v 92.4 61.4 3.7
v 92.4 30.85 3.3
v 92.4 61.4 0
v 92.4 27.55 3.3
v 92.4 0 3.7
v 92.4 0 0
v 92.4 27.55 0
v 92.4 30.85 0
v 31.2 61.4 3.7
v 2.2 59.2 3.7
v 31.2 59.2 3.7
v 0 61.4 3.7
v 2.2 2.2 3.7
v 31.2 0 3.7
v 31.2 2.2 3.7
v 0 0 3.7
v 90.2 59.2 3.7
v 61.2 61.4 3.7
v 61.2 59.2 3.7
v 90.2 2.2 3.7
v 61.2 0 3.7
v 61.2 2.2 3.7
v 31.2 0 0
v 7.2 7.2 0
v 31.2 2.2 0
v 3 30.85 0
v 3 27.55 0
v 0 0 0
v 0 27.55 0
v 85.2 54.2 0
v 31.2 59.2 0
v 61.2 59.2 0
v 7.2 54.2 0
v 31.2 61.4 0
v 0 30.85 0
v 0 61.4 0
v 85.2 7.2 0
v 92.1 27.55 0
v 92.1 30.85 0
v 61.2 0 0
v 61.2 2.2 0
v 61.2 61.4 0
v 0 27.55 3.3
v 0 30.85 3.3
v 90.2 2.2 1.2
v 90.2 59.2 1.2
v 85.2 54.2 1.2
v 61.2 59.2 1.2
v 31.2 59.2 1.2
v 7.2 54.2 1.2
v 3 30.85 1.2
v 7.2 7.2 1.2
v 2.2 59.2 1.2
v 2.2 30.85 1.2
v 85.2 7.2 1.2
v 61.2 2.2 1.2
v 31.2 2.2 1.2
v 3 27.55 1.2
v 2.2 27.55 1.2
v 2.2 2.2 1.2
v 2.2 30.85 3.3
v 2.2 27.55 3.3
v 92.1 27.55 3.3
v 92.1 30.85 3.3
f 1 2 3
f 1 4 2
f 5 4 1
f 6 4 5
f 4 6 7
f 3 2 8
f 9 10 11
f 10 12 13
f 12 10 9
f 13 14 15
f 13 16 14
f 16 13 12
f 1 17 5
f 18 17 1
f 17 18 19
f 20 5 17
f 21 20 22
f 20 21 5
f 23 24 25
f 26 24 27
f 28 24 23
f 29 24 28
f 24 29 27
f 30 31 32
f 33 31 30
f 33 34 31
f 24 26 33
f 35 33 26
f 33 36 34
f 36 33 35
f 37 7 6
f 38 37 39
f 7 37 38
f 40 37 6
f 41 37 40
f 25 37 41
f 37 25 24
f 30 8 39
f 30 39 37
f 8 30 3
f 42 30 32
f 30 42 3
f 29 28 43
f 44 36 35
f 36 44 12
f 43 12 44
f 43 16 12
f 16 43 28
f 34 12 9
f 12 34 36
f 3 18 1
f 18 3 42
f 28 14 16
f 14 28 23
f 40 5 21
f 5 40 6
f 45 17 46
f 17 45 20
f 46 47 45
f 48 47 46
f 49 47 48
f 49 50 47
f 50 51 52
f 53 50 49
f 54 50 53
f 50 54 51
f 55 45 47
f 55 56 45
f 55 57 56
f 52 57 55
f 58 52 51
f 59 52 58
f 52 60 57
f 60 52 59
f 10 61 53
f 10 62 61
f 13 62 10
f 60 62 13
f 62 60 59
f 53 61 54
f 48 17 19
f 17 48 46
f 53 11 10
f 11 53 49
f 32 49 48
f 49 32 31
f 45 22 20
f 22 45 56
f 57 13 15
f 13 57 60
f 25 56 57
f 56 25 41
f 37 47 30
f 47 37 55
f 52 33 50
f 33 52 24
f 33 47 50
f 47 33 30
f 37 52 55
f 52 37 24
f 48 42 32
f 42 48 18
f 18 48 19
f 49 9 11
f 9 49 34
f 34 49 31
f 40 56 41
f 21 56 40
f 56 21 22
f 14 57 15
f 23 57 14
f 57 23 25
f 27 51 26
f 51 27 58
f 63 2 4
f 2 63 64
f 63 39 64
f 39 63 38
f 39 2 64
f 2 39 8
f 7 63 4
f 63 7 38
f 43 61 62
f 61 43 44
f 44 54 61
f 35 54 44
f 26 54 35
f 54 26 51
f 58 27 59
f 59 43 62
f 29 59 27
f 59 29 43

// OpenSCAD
// file: grid.scad
// Saboteur Card Grid - Single Horizontal Card Holder with Center Cutout and Repositioned Connectors
// For cards of size 56mm × 87mm (positioned horizontally)

/* Parameters */
// Card dimensions (horizontal orientation)
card_width = 87;  // Card width when placed horizontally
card_height = 56; // Card height when placed horizontally

// Tile parameters
card_clearance = 0.5; // Clearance for easy card removal
wall_thickness = 2.2; // Thickness of walls
base_height = 1.2;    // Height of the base
wall_height = 2.5;    // Height of walls above the base
border_width = 5;     // Width of the border that supports the card

// Connector parameters
connector_height = 3;
connector_width = 6;
connector_depth = 3;
connector_tolerance = 0.3;
// Additional vertical offset for top and bottom connectors to keep card access clear
connector_gap = 2;

// Total dimensions of a single tile
total_width = card_width + 2 * card_clearance;
total_height = card_height + 2 * card_clearance;
total_depth = base_height + wall_height;

// Module for a single card holder with center cutout
module card_frame() {
    difference() {
        // Outer frame
        cube([total_width + 2*wall_thickness, 
              total_height + 2*wall_thickness, 
              total_depth]);
        
        // Inner cutout for card - only cutting down from the top, leaving a lip
        translate([wall_thickness, wall_thickness, base_height]) {
            cube([total_width, total_height, wall_height + 1]);
        }
        
        // Center cutout to save material
        translate([wall_thickness + border_width, 
                   wall_thickness + border_width, 
                   0]) {
            cube([total_width - 2*border_width, 
                  total_height - 2*border_width, 
                  total_depth]);
        }
        
        // Cutout for card access/removal at the bottom edge
        translate([wall_thickness + total_width/2 - 15, wall_thickness + total_height, 0]) {
            cube([30, wall_thickness, total_depth + 1]);
        }
        
        // Cutout for card access/removal at the top edge
        translate([wall_thickness + total_width/2 - 15, 0, 0]) {
            cube([30, wall_thickness, total_depth + 1]);
        }
    }
}

// Module for a male connector tab (protruding)
module male_connector() {
    cube([connector_width, connector_depth, connector_height]);
}

// Module for a female connector socket (recessed)
module female_connector() {
    cube([connector_width + connector_tolerance, 
          connector_depth + connector_tolerance, 
          connector_height + connector_tolerance]);
}

// Module for a complete single tile with connectors on all sides.
// The top and bottom connectors are shifted vertically by connector_gap to clear the card access cutouts.
module tile() {
    difference() {
        union() {
            // Base card frame
            card_frame();
            
            // Male connectors on all four sides
            // Right center (unchanged)
            translate([total_width + 2*wall_thickness, 
                      wall_thickness + total_height/2 - connector_width/2, 
                      0])
                male_connector();
            
            // Bottom center - shifted further down by connector_gap
            translate([wall_thickness + total_width/2 - connector_width/2,
                      total_height + 2*wall_thickness + connector_gap, 
                      0])
                male_connector();
                
            // Left center (unchanged)
            translate([-connector_depth,
                      wall_thickness + total_height/2 - connector_width/2, 
                      0])
                male_connector();
                
            // Top center - shifted further up (negative Y) by connector_gap
            translate([wall_thickness + total_width/2 - connector_width/2,
                      -connector_depth - connector_gap, 
                      0])
                male_connector();
        }
        
        // Female connectors on all four sides, with matching adjustments for top and bottom.
        // Right center
        translate([total_width + 2*wall_thickness - connector_tolerance,
                  wall_thickness + total_height/2 - connector_width/2 - connector_tolerance/2, 
                  0])
            female_connector();
        
        // Bottom center
        translate([wall_thickness + total_width/2 - connector_width/2 - connector_tolerance/2,
                  total_height + 2*wall_thickness + connector_gap - connector_tolerance, 
                  0])
            female_connector();
            
        // Left center
        translate([-connector_depth - connector_tolerance,
                  wall_thickness + total_height/2 - connector_width/2 - connector_tolerance/2, 
                  0])
            female_connector();
            
        // Top center
        translate([wall_thickness + total_width/2 - connector_width/2 - connector_tolerance/2,
                  -connector_depth - connector_gap - connector_tolerance, 
                  0])
            female_connector();
    }
}

// Render a single tile
tile();

// Dimensions of a single tile (for reference)
echo("Single tile dimensions:");
echo(str("Width: ", total_width + 2*wall_thickness, " mm"));
echo(str("Height: ", total_height + 2*wall_thickness, " mm"));
echo(str("Depth: ", total_depth, " mm"));
// main file
// Standard entry point for this project
include <grid.scad>
